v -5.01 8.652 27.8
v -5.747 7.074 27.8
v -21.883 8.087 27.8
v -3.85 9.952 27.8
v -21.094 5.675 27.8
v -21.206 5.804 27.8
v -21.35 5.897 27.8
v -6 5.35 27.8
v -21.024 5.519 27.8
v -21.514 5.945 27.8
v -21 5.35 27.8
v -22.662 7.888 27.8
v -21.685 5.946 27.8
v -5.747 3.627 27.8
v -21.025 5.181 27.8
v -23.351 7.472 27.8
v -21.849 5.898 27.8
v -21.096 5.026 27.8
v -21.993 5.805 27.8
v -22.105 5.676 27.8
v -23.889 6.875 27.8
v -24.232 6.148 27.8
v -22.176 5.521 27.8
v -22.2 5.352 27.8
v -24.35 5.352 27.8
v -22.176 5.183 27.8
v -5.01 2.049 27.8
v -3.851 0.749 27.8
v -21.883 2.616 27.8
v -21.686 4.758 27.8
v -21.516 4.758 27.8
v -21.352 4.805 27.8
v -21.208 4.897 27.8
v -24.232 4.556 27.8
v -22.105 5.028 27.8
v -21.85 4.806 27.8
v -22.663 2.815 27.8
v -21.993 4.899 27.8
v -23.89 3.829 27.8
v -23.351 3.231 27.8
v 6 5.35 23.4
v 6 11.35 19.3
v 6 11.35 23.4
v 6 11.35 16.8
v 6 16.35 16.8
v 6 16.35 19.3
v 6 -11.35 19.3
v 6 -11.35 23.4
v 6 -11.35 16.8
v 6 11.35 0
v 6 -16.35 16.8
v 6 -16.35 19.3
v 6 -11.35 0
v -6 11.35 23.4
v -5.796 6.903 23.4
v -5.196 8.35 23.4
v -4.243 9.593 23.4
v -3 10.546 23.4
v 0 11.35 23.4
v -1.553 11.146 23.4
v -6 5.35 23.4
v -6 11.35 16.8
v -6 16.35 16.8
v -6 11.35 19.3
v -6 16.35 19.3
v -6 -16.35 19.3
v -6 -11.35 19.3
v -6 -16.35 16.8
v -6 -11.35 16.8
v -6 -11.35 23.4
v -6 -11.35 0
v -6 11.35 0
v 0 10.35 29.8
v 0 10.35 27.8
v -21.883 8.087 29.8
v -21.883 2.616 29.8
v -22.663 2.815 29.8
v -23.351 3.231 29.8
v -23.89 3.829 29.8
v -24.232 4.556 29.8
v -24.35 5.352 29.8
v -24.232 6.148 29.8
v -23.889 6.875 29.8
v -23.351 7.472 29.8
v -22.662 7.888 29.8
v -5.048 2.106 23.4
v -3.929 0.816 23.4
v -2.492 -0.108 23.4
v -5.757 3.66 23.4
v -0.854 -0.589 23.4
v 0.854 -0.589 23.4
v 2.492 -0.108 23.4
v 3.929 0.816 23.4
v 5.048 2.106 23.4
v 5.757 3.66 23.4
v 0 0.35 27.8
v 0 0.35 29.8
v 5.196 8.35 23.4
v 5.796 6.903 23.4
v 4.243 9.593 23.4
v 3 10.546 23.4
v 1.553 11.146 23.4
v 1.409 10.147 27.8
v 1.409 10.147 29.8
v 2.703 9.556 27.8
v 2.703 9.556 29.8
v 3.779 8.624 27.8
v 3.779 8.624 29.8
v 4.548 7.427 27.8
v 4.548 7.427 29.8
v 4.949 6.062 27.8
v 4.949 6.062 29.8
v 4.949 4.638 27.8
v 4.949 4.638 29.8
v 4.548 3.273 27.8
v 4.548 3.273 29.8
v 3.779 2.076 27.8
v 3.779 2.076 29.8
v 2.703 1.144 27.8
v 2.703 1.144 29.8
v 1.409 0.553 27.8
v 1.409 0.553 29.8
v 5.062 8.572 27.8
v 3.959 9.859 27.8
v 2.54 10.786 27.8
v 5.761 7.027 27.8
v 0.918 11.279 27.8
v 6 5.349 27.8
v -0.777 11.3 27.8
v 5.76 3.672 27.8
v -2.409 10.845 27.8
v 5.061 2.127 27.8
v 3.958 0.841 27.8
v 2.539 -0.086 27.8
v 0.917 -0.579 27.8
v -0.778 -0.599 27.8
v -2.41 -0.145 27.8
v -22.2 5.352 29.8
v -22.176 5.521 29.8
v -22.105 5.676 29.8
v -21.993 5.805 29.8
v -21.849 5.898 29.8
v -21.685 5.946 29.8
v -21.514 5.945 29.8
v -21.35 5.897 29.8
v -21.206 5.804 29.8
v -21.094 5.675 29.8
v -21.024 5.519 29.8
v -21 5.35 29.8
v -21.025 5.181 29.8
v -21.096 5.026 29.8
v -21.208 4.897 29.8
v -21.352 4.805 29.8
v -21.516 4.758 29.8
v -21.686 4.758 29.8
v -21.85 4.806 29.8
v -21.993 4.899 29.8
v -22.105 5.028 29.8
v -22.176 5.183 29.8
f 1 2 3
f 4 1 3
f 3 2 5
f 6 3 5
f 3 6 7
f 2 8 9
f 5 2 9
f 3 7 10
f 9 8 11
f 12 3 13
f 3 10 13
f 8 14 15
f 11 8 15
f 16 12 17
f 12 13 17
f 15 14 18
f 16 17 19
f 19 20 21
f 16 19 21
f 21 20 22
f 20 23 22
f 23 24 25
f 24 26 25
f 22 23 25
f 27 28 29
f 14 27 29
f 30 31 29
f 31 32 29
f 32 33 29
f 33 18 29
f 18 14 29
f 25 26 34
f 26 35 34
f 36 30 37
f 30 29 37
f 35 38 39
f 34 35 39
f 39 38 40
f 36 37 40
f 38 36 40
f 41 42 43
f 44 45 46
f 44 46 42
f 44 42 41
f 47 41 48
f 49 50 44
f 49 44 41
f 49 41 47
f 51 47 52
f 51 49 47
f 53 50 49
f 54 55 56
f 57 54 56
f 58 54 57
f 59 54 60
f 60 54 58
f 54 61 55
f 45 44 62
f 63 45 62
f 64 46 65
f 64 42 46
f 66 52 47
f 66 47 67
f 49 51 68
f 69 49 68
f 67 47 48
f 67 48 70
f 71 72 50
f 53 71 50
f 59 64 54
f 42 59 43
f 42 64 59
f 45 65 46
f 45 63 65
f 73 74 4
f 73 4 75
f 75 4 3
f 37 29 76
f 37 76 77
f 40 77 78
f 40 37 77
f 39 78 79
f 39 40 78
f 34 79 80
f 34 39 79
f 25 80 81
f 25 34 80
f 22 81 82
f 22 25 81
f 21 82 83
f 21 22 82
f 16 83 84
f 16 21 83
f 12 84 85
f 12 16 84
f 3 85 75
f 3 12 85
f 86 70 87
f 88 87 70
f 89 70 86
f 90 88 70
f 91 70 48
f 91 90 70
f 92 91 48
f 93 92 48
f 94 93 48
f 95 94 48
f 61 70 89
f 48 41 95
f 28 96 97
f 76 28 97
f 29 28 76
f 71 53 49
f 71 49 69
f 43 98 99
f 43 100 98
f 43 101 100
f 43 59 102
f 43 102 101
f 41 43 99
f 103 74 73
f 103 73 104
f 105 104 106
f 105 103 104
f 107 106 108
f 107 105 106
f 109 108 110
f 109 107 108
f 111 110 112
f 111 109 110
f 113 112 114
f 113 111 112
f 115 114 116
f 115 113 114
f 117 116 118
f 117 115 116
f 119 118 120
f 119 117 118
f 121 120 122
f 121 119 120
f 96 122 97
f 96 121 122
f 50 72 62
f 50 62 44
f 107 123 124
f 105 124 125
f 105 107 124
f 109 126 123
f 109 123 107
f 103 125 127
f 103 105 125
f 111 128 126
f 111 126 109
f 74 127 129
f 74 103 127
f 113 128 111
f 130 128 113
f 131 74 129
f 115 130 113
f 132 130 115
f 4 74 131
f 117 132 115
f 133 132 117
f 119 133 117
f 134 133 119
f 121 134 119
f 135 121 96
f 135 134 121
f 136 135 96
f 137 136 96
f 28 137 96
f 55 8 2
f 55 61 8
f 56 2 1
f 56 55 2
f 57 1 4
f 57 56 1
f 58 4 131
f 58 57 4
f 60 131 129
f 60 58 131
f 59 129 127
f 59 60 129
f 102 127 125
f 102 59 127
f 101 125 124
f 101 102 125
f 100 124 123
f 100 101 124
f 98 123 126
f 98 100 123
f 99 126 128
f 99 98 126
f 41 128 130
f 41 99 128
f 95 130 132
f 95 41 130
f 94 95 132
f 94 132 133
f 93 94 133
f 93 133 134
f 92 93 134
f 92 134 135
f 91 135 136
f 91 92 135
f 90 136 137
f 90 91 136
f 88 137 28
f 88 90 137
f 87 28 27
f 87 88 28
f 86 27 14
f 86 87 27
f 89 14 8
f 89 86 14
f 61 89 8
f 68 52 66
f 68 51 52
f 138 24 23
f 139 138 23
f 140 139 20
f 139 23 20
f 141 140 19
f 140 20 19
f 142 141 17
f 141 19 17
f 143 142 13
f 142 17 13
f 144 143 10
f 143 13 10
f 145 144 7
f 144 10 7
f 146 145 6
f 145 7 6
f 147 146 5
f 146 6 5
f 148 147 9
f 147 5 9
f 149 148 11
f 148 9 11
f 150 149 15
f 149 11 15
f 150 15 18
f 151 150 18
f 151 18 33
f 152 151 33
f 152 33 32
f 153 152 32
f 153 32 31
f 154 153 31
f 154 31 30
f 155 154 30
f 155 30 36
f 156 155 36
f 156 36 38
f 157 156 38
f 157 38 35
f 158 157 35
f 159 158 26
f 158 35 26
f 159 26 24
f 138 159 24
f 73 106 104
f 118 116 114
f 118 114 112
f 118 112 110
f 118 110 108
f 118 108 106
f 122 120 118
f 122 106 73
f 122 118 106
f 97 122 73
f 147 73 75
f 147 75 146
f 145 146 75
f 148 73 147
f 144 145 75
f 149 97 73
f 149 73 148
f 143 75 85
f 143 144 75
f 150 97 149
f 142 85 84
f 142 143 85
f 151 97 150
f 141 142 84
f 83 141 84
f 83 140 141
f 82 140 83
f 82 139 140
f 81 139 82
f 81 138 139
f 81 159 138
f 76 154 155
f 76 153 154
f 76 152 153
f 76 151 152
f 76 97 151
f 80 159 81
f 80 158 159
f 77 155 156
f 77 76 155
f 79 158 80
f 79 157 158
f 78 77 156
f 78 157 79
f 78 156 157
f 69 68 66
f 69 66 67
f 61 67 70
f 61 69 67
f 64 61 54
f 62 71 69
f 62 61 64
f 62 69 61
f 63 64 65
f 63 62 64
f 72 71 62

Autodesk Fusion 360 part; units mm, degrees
sketch "Sketch1" plane through (0, 0, 0) normal (0, 0, 1) x (1, 0, 0)
  line L0 (6, -11.35) -> (-6, -11.35)
  line L1 (-6, -11.35) -> (-6, 11.35)
  line L2 (-6, 11.35) -> (6, 11.35)
  line L3 (6, 11.35) -> (6, -11.35)
  line L4 (6, -11.35) -> (-6, 11.35) construction
  line L5 (-6, -11.35) -> (6, 11.35) construction
  dimension "d1" = 12
  dimension "d2" = 22.7
extrude "Extrude1" add sketch "Sketch1" along normal blind 16.8 makes body 1
sketch "Sketch2" plane through (0, 0, 16.8) normal (0, 0, 1) x (-1, 0, 0)
  line L0 (-6, -11.35) -> (6, -11.35)
  line L1 (6, -11.35) -> (6, 11.35)
  line L2 (6, 11.35) -> (-6, 11.35)
  line L3 (-6, 11.35) -> (-6, -11.35)
  line L4 (-6, 16.35) -> (6, 16.35)
  line L5 (6, 16.35) -> (6, -16.35)
  line L6 (6, -16.35) -> (-6, -16.35)
  line L7 (-6, -16.35) -> (-6, 16.35)
  line L8 (-6, 16.35) -> (6, -16.35) construction
  line L9 (6, 16.35) -> (-6, -16.35) construction
  dimension "d5" = 12
  dimension "d6" = 32.7
extrude "Extrude2" add sketch "Sketch2" along normal blind 2.5 separate body contours L0 L5 L6 L7 | L2 L4 L5 L7 makes body 2 at (2, -14.6833, 16.8) makes body 3 at (2, 13.0167, 16.8)
extrude "Extrude3" add 1 faces at (2, -3.7833, 16.8) along direction (0, 0, 1) blind 6.6 on bodies 1 bodies 1 2 3
sketch "Sketch3" plane through (0, 0, 23.4) normal (0, 0, 1) x (-1, 0, 0)
  line L0 (-6, -11.35) -> (6, -11.35)
  line L1 (6, -11.35) -> (6, 11.35)
  line L2 (6, 11.35) -> (-6, 11.35)
  line L3 (-6, 11.35) -> (-6, -11.35)
  circle A0 centre (0, -11.35) radius 6
  circle A1 centre (0, -5.35) radius 6
extrude "Extrude4" add sketch "Sketch3" along normal blind 4.4 contours A0 A1 | A0 A1 bodies 1
sketch "Sketch4" plane through (0, 0, 27.8) normal (0, 0, 1) x (-1, 0, 0)
  circle A0 centre (0, -5.35) radius 6
  circle A1 centre (0, -5.35) radius 5
  line L0 (5, -5.35) -> (21, -5.35)
  circle A2 centre (21.6, -5.3517) radius 0.6
  circle A3 centre (21.6, -5.3517) radius 2.75
  line L1 (0, -10.35) -> (21.8829, -8.0871)
  line L2 (0, -0.35) -> (21.8833, -2.6163)
  dimension "d13" = 10
  dimension "d14" = 16
  dimension "d15" = 1.2
  dimension "d16" = 5.5
extrude "Extrude5" add sketch "Sketch4" along normal blind 2 contours A0 A1 L0 L2 | A0 L0 A3 L1 | A0 A1 L0 L1 | A0 L0 A3 L2 | A1 L1 L2 | A3 bodies 1
